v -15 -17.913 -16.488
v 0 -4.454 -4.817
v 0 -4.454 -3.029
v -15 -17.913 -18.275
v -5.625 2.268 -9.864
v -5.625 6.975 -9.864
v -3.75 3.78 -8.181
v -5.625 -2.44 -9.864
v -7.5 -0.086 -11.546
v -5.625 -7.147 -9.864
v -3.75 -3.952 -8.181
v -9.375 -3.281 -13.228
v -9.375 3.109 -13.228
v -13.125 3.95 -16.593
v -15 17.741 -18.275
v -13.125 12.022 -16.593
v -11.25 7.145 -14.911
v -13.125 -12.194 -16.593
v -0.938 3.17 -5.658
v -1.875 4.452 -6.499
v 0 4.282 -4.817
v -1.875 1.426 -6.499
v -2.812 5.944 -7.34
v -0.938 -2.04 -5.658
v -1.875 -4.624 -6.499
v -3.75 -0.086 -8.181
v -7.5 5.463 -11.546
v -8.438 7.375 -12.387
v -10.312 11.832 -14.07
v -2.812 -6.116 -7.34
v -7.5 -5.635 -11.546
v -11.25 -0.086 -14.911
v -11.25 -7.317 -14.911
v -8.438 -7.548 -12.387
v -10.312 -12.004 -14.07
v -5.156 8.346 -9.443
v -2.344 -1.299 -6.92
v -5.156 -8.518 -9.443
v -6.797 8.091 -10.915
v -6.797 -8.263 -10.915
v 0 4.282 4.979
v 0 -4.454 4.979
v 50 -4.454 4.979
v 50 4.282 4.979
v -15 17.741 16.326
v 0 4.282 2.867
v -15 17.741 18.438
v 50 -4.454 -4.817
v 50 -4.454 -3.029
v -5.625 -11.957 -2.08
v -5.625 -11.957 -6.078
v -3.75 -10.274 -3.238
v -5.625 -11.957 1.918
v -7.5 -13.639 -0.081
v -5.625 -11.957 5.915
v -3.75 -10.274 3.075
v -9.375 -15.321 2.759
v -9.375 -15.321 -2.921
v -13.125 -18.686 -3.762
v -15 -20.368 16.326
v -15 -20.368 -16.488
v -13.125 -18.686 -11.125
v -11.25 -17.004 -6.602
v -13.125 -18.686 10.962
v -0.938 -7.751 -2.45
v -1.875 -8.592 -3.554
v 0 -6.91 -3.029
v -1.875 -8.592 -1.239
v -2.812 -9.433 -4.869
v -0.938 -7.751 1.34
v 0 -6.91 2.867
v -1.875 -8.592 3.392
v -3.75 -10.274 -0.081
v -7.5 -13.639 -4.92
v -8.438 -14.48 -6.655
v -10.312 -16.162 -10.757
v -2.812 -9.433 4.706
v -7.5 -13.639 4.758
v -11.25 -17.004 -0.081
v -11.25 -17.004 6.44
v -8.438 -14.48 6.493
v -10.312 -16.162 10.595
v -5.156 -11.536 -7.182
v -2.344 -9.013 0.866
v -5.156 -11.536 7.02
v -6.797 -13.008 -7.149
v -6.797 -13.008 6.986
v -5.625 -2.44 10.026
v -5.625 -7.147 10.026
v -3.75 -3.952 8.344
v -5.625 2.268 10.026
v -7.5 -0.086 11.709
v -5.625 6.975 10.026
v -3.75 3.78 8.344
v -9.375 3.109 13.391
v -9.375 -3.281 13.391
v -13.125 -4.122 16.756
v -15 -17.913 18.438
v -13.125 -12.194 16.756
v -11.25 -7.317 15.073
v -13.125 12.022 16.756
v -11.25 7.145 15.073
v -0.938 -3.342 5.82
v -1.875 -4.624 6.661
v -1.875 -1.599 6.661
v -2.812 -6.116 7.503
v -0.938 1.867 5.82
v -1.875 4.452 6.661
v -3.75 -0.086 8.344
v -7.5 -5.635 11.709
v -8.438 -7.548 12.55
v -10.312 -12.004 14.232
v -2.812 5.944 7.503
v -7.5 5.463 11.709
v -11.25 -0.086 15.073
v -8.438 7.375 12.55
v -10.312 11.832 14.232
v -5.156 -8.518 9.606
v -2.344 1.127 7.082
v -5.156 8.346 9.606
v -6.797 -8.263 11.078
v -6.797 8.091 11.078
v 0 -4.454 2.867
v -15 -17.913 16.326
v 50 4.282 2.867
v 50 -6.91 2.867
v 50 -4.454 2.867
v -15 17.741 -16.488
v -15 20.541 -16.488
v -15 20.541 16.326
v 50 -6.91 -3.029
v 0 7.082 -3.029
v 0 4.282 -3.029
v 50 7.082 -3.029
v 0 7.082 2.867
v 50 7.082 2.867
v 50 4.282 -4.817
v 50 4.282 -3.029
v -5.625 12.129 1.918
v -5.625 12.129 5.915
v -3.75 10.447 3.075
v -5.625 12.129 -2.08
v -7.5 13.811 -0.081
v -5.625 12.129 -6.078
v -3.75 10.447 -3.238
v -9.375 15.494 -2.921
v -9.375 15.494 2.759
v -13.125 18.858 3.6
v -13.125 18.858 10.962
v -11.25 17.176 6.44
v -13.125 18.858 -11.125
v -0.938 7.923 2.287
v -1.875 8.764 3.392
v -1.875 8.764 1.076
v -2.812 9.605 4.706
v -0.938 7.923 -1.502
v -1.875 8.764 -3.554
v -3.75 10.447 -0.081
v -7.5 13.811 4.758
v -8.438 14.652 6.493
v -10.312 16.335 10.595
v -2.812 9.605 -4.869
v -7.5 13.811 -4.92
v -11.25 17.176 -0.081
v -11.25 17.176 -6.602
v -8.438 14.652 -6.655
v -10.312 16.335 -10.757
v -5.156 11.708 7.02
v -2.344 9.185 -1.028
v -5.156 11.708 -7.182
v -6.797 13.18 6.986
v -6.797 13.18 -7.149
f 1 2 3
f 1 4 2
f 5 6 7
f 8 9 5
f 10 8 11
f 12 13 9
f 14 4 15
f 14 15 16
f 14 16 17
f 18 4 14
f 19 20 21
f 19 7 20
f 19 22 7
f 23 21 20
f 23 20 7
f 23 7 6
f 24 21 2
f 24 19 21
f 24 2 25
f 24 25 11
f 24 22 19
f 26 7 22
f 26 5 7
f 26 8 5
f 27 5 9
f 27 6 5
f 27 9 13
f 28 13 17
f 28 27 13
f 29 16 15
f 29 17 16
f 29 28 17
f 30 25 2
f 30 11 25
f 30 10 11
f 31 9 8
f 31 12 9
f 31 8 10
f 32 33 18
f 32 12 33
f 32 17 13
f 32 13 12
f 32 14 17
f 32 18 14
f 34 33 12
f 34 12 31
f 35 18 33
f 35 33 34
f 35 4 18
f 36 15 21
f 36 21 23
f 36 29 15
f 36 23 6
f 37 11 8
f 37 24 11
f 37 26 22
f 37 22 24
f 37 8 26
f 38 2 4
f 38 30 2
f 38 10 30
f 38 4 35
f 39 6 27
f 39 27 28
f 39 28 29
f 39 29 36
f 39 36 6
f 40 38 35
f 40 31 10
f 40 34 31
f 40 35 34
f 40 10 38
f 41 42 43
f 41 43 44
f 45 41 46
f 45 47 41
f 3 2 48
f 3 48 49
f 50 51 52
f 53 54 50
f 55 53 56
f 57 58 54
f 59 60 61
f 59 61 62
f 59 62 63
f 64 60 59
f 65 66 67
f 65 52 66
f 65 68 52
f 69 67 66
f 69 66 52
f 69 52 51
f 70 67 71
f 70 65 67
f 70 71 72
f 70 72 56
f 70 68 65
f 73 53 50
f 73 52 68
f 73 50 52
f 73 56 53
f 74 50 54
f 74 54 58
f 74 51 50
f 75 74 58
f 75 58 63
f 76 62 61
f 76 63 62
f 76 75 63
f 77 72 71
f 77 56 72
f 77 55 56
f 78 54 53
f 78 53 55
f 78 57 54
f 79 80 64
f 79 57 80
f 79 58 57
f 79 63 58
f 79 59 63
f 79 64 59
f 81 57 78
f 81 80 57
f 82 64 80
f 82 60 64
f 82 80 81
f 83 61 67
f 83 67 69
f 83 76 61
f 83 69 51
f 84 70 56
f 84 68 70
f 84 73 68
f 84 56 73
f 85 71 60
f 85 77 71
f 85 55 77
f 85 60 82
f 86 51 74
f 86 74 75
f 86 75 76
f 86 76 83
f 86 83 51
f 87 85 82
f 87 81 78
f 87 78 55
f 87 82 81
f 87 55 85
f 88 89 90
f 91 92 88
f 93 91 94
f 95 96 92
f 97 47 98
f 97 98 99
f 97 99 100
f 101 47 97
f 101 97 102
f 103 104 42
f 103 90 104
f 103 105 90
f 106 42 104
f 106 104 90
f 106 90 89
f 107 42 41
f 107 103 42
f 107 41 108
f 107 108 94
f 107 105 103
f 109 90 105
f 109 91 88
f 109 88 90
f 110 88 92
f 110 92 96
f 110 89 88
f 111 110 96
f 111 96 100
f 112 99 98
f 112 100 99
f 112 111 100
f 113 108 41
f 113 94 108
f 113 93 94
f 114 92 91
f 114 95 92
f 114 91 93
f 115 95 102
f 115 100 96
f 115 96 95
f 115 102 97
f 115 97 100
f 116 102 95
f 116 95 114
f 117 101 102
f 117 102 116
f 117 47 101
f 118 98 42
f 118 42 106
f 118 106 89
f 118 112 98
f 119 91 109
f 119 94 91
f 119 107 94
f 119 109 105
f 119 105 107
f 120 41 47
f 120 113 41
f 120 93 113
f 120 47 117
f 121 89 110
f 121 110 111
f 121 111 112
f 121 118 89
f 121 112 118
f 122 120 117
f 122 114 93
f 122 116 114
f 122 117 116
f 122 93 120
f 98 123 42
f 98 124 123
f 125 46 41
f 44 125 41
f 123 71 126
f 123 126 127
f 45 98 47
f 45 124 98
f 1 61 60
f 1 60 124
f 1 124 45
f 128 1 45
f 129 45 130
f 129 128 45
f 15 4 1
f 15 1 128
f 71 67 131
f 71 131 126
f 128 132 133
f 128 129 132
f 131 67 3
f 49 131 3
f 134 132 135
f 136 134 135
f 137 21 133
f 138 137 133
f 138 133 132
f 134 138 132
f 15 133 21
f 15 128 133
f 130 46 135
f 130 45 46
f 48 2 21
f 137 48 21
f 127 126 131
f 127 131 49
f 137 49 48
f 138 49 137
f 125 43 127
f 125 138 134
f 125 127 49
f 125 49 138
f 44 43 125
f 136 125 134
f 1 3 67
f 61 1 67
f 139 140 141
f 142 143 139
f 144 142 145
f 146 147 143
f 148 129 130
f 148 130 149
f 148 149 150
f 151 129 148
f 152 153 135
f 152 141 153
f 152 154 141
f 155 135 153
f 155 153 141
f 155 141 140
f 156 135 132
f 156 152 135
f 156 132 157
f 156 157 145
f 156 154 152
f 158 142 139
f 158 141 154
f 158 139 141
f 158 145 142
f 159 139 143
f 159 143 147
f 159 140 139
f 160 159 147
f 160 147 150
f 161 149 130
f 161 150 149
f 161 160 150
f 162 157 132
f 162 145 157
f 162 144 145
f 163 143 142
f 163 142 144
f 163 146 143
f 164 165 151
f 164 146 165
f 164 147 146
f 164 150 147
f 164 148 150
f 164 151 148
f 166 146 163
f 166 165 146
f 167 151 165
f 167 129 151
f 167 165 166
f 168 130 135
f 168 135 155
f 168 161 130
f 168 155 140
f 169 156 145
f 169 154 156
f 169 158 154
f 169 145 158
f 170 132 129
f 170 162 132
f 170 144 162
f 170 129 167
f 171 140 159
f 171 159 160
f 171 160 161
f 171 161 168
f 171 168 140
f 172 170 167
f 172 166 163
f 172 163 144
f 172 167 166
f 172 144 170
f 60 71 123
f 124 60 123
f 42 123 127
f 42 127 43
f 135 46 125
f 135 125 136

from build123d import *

# Parameters (mm, degrees)
F0_W     = 8.736010408
F0_H     = 2.1122291218
F0_H_2   = 1.7872701865
F0_W_2   = 2.455455251
F0_H_3   = 5.8963275515
F0_W_3   = 2.8000103775
F1_DEPTH = 50
F2_DEPTH = 15
F2_TAPER = -41.9


with BuildPart() as f1:
    # F0 (on Right) → F1 (new body)
    with BuildSketch(Plane.YZ):
        with Locations((-0.0861387816, 3.9230386028)):
            Rectangle(F0_W, F0_H)
        with Locations((-0.0861387816, -3.9230386028)):
            Rectangle(F0_W, F0_H_2)
        with Locations((-5.6818716112, -0.0812397338)):
            Rectangle(F0_W_2, F0_H_3)
        with Locations((5.6818716112, -0.0812397338)):
            Rectangle(F0_W_3, F0_H_3)
        with Locations((-0.0861387816, -0.0812397338)):
            Rectangle(F0_W, F0_H_3)
    extrude(amount=F1_DEPTH)

    # F1_face (on face) → F2 (join)
    with BuildSketch(Plane(origin=(0, 0.0357904821, 0.0380455387), x_dir=(0, 1, 0), z_dir=(-1, 0, 0))):
        Polygon((-4.4899344677, -4.941107625), (4.2460759403, -4.941107625), (4.2460759403, -2.8288785031), (7.0460863178, -2.8288785031), (7.0460863178, 3.0674490483), (4.2460759403, 3.0674490483), (4.2460759403, 4.8547192348), (-4.4899344677, 4.8547192348), (-4.4899344677, 3.0674490483), (-6.9453897188, 3.0674490483), (-6.9453897188, -2.8288785031), (-4.4899344677, -2.8288785031), align=None)
    extrude(amount=F2_DEPTH, taper=F2_TAPER)


solid = f1.part
